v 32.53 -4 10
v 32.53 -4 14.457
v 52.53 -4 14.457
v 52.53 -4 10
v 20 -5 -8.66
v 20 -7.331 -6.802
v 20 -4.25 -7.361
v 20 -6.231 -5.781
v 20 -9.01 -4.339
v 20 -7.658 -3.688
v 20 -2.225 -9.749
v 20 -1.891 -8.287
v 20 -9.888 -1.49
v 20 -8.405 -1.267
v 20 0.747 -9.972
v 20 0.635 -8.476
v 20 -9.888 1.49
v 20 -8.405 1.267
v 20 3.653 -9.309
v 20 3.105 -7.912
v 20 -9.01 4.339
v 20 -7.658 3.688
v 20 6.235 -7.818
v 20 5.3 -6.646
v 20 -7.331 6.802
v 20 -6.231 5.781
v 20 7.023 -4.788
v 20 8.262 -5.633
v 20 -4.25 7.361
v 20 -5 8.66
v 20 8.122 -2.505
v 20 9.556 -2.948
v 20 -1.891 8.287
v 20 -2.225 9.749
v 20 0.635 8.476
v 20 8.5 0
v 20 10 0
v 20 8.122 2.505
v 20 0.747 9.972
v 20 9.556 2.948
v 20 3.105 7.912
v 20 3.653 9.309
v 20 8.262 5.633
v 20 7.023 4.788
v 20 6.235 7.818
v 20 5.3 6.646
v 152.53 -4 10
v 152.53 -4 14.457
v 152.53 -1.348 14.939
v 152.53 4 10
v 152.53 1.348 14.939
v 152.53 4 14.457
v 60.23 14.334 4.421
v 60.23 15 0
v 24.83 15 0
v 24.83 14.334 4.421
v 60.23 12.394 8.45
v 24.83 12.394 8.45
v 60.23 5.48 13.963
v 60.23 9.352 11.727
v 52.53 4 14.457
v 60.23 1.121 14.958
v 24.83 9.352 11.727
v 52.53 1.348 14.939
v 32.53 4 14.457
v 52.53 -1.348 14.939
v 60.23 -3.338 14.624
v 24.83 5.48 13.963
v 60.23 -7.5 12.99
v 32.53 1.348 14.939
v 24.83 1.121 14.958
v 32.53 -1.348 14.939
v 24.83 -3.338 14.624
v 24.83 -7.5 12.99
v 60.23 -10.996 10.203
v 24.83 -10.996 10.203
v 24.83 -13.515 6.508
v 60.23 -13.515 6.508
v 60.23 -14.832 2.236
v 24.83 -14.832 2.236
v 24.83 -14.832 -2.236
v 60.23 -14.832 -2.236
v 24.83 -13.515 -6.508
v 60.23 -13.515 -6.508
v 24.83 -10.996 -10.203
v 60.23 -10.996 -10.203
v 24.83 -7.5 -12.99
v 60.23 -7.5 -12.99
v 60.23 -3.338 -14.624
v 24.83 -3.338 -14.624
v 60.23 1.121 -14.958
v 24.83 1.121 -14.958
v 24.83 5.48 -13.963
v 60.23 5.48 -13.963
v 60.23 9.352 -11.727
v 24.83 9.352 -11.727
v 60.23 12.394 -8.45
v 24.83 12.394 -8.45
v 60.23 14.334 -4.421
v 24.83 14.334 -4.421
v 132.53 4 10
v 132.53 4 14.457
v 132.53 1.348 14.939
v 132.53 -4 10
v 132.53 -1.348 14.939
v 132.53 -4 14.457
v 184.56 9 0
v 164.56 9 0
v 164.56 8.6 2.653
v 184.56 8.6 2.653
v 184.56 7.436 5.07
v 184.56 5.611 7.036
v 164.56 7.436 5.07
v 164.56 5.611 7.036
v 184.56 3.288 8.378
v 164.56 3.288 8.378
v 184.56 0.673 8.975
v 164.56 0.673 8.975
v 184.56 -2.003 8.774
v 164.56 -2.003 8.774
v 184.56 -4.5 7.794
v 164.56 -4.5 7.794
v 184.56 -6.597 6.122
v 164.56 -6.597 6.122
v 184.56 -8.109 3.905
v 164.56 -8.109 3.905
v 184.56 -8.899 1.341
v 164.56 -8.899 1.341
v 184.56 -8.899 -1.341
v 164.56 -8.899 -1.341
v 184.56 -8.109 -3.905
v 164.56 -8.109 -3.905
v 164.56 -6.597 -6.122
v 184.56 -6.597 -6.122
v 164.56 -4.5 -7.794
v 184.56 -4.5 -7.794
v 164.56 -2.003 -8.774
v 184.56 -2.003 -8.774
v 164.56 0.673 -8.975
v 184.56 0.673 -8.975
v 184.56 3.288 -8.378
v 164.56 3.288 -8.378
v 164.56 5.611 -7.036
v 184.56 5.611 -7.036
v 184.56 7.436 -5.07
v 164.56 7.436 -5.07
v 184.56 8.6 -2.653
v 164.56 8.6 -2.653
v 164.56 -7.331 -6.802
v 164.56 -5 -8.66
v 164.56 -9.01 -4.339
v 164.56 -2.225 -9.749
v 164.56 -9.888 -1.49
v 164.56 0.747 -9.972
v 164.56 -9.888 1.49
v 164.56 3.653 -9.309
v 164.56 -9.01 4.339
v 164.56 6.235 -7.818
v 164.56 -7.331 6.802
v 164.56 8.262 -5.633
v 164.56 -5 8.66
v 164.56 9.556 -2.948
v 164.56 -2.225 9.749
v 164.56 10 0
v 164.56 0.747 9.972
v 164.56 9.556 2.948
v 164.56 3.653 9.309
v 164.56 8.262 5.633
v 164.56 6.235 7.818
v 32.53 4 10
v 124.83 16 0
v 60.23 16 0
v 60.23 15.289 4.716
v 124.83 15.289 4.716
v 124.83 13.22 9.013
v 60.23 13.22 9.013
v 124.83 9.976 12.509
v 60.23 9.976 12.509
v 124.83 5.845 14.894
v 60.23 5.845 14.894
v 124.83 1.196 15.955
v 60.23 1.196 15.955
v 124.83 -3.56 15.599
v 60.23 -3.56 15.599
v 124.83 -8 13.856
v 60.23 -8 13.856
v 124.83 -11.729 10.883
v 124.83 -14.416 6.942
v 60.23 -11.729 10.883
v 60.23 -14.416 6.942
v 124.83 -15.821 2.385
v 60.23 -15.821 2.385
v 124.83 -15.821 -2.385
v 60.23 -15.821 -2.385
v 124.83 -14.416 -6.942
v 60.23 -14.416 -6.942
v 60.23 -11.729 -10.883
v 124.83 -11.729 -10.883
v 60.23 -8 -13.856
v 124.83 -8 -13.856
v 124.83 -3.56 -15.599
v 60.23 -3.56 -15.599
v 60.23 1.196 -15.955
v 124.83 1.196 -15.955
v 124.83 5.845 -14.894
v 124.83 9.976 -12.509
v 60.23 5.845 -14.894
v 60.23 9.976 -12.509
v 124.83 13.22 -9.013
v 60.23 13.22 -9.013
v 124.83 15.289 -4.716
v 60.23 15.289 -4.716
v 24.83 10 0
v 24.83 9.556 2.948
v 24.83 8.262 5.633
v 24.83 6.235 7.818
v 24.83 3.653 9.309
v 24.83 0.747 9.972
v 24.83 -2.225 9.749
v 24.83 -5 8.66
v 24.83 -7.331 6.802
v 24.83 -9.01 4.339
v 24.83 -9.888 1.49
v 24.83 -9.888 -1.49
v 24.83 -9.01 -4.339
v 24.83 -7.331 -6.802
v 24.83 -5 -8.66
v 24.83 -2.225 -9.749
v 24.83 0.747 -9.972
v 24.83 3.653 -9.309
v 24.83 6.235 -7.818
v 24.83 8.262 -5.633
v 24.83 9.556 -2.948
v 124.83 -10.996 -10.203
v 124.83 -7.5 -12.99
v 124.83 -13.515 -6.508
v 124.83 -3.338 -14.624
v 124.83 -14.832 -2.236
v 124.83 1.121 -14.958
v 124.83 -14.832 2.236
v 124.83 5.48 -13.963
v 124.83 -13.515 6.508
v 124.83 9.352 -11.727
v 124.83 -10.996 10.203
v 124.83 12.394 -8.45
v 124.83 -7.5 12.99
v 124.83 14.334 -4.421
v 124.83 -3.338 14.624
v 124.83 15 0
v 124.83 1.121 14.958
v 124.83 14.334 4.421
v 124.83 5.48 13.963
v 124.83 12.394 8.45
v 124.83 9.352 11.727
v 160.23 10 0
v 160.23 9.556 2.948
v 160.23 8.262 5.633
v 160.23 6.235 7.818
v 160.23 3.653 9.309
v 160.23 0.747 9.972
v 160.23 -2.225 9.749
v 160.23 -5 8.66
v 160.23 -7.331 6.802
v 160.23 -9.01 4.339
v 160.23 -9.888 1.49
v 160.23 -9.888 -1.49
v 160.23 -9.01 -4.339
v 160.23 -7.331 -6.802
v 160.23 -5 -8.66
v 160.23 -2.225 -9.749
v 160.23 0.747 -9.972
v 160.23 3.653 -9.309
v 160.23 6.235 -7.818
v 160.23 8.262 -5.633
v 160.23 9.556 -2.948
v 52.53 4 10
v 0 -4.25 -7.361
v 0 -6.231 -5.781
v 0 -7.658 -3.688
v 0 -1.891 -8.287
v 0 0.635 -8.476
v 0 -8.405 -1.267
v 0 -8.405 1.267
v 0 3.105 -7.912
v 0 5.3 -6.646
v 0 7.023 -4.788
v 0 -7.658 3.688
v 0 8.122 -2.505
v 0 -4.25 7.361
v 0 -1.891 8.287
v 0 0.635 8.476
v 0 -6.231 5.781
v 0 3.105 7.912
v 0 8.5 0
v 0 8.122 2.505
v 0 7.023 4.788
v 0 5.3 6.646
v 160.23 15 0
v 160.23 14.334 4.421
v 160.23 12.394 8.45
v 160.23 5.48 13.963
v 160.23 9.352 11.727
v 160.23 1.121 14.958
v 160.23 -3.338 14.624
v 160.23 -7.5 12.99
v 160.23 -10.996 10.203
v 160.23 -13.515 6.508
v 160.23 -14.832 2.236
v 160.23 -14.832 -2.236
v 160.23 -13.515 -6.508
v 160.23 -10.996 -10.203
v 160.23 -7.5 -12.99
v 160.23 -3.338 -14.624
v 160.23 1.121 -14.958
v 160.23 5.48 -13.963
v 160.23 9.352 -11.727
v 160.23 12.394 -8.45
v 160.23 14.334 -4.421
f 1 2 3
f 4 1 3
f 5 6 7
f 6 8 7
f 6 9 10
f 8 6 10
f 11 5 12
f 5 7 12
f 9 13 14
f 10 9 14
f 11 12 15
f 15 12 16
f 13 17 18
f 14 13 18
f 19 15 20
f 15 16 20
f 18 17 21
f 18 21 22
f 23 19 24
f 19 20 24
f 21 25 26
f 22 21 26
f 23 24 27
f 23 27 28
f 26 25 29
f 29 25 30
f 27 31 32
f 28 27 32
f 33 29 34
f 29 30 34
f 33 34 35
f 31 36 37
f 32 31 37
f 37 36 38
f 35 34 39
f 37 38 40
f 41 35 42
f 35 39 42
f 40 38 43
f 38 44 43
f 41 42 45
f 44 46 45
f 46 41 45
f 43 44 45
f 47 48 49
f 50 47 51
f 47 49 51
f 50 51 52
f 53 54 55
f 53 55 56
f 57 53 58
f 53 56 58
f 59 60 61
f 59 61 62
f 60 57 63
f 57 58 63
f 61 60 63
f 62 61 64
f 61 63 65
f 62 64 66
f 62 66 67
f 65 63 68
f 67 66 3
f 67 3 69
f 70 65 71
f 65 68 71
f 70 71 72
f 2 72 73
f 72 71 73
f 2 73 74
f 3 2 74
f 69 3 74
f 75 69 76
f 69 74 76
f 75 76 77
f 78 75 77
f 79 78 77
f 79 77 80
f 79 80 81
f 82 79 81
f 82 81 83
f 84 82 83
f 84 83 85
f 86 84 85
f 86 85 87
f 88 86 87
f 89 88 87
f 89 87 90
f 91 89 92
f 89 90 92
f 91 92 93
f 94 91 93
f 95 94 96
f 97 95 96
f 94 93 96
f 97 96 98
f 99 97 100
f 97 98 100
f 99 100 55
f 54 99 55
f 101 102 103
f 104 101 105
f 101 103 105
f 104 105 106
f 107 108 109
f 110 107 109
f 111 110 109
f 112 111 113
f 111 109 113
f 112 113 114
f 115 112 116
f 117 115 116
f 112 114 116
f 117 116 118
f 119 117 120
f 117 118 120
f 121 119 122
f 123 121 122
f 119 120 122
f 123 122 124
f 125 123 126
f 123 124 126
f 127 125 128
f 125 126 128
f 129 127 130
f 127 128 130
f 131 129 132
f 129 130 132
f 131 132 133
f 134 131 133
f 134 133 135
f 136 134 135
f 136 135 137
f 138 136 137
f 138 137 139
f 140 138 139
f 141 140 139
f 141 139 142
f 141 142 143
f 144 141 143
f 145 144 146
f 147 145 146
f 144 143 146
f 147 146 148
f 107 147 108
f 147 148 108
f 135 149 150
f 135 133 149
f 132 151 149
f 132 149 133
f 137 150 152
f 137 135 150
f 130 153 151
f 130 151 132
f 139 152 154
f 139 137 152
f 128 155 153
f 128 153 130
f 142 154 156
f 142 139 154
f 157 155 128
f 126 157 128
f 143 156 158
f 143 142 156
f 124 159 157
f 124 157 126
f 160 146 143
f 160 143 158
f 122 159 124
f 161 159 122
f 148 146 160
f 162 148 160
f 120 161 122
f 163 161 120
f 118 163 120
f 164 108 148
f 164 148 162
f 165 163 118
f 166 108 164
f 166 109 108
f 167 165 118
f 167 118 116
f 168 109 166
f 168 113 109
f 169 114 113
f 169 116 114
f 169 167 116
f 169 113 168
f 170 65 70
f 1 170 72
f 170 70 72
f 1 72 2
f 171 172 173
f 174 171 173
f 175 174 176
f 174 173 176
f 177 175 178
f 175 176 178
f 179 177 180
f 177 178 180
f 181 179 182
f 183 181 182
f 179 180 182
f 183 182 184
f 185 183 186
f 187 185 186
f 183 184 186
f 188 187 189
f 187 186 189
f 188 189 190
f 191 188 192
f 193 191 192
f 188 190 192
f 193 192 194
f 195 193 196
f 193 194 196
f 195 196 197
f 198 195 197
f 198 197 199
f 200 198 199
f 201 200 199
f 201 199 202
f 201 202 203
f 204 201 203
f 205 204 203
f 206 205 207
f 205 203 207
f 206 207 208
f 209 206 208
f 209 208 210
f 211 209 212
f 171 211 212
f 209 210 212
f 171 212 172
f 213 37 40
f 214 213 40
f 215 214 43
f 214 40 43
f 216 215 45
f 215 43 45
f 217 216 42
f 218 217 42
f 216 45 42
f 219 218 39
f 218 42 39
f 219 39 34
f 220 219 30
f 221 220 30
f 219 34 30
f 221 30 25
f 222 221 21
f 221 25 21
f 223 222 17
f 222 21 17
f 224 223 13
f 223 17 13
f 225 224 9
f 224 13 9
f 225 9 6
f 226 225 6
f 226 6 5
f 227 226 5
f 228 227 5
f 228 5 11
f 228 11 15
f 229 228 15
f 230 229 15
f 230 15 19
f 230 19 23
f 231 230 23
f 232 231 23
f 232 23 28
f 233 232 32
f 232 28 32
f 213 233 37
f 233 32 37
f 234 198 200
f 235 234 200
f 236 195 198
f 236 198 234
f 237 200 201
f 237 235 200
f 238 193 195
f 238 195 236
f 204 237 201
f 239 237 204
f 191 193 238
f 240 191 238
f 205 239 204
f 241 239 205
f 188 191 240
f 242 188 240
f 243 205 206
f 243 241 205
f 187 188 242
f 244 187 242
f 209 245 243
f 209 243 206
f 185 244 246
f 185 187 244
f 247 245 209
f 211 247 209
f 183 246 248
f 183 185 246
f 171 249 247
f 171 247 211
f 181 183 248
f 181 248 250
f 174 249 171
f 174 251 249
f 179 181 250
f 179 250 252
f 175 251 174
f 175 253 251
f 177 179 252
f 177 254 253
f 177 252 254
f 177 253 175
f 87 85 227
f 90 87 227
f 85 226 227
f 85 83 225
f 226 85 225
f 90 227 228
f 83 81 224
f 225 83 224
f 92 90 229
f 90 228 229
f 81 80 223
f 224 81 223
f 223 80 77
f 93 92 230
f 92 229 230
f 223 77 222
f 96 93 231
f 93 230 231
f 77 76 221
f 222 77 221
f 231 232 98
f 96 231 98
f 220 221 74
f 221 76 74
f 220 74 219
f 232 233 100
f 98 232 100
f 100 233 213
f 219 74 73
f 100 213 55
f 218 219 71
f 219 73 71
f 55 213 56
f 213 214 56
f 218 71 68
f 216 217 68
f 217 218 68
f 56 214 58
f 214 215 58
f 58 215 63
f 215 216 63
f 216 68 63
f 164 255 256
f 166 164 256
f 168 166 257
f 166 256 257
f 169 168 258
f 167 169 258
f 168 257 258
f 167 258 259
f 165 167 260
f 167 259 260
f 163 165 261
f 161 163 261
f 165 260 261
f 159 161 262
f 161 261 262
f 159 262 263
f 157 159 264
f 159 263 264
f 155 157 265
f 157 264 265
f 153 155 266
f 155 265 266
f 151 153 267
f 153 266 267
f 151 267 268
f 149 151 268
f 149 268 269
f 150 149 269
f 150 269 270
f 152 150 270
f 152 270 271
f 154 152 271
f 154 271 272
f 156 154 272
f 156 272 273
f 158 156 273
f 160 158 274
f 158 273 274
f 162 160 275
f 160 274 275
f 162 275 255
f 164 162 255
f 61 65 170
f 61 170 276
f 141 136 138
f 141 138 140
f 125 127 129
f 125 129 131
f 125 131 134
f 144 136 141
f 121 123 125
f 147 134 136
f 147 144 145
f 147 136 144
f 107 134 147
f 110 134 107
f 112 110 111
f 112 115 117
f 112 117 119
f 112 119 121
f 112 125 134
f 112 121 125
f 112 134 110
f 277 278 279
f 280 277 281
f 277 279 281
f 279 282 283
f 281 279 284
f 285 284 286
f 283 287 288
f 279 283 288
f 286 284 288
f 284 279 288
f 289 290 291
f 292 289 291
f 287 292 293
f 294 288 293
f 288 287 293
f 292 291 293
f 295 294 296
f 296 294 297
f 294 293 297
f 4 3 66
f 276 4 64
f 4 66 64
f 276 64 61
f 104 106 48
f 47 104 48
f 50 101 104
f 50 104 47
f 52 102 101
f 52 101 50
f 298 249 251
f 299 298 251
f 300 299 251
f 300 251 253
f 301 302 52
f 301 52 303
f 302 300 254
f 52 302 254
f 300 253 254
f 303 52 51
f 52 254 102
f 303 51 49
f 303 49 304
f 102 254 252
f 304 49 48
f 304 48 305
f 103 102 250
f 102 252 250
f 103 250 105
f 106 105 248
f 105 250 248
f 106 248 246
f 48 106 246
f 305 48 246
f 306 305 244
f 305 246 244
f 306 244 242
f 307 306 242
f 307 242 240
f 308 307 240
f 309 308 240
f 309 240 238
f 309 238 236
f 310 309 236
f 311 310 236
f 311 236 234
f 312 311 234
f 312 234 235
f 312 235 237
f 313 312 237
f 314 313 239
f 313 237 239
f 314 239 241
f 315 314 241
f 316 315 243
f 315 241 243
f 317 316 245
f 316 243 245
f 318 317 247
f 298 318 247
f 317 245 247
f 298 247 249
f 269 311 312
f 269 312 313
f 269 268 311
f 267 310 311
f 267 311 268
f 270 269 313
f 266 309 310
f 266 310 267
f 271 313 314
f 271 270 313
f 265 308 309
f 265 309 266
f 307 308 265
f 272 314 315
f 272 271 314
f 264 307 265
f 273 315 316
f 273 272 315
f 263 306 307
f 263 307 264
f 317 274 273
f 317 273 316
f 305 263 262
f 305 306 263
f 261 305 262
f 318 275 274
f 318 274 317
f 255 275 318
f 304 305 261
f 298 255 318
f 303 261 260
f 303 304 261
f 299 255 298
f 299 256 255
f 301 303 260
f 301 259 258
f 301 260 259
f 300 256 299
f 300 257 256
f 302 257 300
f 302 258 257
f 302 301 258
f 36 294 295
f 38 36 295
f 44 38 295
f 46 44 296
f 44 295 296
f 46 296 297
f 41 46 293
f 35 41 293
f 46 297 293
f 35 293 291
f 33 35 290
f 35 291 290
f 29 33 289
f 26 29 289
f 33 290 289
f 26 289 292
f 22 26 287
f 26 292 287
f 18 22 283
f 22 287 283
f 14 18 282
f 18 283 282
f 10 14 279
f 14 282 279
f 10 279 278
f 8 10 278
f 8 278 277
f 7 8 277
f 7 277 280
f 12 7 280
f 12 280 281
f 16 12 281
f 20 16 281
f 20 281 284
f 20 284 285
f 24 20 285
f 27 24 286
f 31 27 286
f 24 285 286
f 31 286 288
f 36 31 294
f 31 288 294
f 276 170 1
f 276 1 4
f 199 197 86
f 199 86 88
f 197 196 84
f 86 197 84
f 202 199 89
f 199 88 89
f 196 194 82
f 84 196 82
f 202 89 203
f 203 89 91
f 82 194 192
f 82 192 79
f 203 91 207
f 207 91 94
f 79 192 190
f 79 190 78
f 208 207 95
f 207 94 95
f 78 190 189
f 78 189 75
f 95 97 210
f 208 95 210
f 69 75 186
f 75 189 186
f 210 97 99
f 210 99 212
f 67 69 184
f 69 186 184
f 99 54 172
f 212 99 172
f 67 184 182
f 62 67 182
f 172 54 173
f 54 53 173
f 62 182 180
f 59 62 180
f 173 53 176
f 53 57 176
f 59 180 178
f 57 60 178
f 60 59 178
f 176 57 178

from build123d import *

# Parameters (mm, degrees)
F0_R      = 8.5
F1_DEPTH  = 20
F2_R      = 10
F3_DEPTH  = 4.83
F4_R      = 15
F5_DEPTH  = 35.4
F6_R      = 16
F7_DEPTH  = 64.6
F8_R      = 15
F9_DEPTH  = 35.4
F10_R     = 10
F11_DEPTH = 4.33
F12_R     = 9
F13_DEPTH = 20
F15_W     = 20
F15_H     = 4
F16_DEPTH = 5


with BuildPart() as f1:
    # F0 (on Right) → F1 (new body)
    with BuildSketch(Plane.YZ):
        Circle(F0_R)
    extrude(amount=F1_DEPTH)

    # F2 (on face) → F3 (join)
    with BuildSketch(Plane.YZ.offset(20)):
        Circle(F2_R)
    extrude(amount=F3_DEPTH)

    # F4 (on face) → F5 (join)
    with BuildSketch(Plane.YZ.offset(24.83)):
        Circle(F4_R)
    extrude(amount=F5_DEPTH)

    # F6 (on face) → F7 (join)
    with BuildSketch(Plane.YZ.offset(60.23)):
        Circle(F6_R)
    extrude(amount=F7_DEPTH)

    # F8 (on face) → F9 (join)
    with BuildSketch(Plane.YZ.offset(124.83)):
        Circle(F8_R)
    extrude(amount=F9_DEPTH)

    # F10 (on face) → F11 (join)
    with BuildSketch(Plane.YZ.offset(160.23)):
        Circle(F10_R)
    extrude(amount=F11_DEPTH)

    # F12 (on face) → F13 (join)
    with BuildSketch(Plane.YZ.offset(164.56)):
        Circle(F12_R)
    extrude(amount=F13_DEPTH)

    # F15 (on offset) → F16 (cut)
    with BuildSketch(Plane.XY.offset(15)):
        with Locations((42.53, 2)):
            Rectangle(F15_W, F15_H)
        with Locations((42.53, -2)):
            Rectangle(F15_W, F15_H)
        with Locations((142.53, 2)):
            Rectangle(F15_W, F15_H)
        with Locations((142.53, -2)):
            Rectangle(F15_W, F15_H)
    extrude(amount=-F16_DEPTH, mode=Mode.SUBTRACT)


solid = f1.part
